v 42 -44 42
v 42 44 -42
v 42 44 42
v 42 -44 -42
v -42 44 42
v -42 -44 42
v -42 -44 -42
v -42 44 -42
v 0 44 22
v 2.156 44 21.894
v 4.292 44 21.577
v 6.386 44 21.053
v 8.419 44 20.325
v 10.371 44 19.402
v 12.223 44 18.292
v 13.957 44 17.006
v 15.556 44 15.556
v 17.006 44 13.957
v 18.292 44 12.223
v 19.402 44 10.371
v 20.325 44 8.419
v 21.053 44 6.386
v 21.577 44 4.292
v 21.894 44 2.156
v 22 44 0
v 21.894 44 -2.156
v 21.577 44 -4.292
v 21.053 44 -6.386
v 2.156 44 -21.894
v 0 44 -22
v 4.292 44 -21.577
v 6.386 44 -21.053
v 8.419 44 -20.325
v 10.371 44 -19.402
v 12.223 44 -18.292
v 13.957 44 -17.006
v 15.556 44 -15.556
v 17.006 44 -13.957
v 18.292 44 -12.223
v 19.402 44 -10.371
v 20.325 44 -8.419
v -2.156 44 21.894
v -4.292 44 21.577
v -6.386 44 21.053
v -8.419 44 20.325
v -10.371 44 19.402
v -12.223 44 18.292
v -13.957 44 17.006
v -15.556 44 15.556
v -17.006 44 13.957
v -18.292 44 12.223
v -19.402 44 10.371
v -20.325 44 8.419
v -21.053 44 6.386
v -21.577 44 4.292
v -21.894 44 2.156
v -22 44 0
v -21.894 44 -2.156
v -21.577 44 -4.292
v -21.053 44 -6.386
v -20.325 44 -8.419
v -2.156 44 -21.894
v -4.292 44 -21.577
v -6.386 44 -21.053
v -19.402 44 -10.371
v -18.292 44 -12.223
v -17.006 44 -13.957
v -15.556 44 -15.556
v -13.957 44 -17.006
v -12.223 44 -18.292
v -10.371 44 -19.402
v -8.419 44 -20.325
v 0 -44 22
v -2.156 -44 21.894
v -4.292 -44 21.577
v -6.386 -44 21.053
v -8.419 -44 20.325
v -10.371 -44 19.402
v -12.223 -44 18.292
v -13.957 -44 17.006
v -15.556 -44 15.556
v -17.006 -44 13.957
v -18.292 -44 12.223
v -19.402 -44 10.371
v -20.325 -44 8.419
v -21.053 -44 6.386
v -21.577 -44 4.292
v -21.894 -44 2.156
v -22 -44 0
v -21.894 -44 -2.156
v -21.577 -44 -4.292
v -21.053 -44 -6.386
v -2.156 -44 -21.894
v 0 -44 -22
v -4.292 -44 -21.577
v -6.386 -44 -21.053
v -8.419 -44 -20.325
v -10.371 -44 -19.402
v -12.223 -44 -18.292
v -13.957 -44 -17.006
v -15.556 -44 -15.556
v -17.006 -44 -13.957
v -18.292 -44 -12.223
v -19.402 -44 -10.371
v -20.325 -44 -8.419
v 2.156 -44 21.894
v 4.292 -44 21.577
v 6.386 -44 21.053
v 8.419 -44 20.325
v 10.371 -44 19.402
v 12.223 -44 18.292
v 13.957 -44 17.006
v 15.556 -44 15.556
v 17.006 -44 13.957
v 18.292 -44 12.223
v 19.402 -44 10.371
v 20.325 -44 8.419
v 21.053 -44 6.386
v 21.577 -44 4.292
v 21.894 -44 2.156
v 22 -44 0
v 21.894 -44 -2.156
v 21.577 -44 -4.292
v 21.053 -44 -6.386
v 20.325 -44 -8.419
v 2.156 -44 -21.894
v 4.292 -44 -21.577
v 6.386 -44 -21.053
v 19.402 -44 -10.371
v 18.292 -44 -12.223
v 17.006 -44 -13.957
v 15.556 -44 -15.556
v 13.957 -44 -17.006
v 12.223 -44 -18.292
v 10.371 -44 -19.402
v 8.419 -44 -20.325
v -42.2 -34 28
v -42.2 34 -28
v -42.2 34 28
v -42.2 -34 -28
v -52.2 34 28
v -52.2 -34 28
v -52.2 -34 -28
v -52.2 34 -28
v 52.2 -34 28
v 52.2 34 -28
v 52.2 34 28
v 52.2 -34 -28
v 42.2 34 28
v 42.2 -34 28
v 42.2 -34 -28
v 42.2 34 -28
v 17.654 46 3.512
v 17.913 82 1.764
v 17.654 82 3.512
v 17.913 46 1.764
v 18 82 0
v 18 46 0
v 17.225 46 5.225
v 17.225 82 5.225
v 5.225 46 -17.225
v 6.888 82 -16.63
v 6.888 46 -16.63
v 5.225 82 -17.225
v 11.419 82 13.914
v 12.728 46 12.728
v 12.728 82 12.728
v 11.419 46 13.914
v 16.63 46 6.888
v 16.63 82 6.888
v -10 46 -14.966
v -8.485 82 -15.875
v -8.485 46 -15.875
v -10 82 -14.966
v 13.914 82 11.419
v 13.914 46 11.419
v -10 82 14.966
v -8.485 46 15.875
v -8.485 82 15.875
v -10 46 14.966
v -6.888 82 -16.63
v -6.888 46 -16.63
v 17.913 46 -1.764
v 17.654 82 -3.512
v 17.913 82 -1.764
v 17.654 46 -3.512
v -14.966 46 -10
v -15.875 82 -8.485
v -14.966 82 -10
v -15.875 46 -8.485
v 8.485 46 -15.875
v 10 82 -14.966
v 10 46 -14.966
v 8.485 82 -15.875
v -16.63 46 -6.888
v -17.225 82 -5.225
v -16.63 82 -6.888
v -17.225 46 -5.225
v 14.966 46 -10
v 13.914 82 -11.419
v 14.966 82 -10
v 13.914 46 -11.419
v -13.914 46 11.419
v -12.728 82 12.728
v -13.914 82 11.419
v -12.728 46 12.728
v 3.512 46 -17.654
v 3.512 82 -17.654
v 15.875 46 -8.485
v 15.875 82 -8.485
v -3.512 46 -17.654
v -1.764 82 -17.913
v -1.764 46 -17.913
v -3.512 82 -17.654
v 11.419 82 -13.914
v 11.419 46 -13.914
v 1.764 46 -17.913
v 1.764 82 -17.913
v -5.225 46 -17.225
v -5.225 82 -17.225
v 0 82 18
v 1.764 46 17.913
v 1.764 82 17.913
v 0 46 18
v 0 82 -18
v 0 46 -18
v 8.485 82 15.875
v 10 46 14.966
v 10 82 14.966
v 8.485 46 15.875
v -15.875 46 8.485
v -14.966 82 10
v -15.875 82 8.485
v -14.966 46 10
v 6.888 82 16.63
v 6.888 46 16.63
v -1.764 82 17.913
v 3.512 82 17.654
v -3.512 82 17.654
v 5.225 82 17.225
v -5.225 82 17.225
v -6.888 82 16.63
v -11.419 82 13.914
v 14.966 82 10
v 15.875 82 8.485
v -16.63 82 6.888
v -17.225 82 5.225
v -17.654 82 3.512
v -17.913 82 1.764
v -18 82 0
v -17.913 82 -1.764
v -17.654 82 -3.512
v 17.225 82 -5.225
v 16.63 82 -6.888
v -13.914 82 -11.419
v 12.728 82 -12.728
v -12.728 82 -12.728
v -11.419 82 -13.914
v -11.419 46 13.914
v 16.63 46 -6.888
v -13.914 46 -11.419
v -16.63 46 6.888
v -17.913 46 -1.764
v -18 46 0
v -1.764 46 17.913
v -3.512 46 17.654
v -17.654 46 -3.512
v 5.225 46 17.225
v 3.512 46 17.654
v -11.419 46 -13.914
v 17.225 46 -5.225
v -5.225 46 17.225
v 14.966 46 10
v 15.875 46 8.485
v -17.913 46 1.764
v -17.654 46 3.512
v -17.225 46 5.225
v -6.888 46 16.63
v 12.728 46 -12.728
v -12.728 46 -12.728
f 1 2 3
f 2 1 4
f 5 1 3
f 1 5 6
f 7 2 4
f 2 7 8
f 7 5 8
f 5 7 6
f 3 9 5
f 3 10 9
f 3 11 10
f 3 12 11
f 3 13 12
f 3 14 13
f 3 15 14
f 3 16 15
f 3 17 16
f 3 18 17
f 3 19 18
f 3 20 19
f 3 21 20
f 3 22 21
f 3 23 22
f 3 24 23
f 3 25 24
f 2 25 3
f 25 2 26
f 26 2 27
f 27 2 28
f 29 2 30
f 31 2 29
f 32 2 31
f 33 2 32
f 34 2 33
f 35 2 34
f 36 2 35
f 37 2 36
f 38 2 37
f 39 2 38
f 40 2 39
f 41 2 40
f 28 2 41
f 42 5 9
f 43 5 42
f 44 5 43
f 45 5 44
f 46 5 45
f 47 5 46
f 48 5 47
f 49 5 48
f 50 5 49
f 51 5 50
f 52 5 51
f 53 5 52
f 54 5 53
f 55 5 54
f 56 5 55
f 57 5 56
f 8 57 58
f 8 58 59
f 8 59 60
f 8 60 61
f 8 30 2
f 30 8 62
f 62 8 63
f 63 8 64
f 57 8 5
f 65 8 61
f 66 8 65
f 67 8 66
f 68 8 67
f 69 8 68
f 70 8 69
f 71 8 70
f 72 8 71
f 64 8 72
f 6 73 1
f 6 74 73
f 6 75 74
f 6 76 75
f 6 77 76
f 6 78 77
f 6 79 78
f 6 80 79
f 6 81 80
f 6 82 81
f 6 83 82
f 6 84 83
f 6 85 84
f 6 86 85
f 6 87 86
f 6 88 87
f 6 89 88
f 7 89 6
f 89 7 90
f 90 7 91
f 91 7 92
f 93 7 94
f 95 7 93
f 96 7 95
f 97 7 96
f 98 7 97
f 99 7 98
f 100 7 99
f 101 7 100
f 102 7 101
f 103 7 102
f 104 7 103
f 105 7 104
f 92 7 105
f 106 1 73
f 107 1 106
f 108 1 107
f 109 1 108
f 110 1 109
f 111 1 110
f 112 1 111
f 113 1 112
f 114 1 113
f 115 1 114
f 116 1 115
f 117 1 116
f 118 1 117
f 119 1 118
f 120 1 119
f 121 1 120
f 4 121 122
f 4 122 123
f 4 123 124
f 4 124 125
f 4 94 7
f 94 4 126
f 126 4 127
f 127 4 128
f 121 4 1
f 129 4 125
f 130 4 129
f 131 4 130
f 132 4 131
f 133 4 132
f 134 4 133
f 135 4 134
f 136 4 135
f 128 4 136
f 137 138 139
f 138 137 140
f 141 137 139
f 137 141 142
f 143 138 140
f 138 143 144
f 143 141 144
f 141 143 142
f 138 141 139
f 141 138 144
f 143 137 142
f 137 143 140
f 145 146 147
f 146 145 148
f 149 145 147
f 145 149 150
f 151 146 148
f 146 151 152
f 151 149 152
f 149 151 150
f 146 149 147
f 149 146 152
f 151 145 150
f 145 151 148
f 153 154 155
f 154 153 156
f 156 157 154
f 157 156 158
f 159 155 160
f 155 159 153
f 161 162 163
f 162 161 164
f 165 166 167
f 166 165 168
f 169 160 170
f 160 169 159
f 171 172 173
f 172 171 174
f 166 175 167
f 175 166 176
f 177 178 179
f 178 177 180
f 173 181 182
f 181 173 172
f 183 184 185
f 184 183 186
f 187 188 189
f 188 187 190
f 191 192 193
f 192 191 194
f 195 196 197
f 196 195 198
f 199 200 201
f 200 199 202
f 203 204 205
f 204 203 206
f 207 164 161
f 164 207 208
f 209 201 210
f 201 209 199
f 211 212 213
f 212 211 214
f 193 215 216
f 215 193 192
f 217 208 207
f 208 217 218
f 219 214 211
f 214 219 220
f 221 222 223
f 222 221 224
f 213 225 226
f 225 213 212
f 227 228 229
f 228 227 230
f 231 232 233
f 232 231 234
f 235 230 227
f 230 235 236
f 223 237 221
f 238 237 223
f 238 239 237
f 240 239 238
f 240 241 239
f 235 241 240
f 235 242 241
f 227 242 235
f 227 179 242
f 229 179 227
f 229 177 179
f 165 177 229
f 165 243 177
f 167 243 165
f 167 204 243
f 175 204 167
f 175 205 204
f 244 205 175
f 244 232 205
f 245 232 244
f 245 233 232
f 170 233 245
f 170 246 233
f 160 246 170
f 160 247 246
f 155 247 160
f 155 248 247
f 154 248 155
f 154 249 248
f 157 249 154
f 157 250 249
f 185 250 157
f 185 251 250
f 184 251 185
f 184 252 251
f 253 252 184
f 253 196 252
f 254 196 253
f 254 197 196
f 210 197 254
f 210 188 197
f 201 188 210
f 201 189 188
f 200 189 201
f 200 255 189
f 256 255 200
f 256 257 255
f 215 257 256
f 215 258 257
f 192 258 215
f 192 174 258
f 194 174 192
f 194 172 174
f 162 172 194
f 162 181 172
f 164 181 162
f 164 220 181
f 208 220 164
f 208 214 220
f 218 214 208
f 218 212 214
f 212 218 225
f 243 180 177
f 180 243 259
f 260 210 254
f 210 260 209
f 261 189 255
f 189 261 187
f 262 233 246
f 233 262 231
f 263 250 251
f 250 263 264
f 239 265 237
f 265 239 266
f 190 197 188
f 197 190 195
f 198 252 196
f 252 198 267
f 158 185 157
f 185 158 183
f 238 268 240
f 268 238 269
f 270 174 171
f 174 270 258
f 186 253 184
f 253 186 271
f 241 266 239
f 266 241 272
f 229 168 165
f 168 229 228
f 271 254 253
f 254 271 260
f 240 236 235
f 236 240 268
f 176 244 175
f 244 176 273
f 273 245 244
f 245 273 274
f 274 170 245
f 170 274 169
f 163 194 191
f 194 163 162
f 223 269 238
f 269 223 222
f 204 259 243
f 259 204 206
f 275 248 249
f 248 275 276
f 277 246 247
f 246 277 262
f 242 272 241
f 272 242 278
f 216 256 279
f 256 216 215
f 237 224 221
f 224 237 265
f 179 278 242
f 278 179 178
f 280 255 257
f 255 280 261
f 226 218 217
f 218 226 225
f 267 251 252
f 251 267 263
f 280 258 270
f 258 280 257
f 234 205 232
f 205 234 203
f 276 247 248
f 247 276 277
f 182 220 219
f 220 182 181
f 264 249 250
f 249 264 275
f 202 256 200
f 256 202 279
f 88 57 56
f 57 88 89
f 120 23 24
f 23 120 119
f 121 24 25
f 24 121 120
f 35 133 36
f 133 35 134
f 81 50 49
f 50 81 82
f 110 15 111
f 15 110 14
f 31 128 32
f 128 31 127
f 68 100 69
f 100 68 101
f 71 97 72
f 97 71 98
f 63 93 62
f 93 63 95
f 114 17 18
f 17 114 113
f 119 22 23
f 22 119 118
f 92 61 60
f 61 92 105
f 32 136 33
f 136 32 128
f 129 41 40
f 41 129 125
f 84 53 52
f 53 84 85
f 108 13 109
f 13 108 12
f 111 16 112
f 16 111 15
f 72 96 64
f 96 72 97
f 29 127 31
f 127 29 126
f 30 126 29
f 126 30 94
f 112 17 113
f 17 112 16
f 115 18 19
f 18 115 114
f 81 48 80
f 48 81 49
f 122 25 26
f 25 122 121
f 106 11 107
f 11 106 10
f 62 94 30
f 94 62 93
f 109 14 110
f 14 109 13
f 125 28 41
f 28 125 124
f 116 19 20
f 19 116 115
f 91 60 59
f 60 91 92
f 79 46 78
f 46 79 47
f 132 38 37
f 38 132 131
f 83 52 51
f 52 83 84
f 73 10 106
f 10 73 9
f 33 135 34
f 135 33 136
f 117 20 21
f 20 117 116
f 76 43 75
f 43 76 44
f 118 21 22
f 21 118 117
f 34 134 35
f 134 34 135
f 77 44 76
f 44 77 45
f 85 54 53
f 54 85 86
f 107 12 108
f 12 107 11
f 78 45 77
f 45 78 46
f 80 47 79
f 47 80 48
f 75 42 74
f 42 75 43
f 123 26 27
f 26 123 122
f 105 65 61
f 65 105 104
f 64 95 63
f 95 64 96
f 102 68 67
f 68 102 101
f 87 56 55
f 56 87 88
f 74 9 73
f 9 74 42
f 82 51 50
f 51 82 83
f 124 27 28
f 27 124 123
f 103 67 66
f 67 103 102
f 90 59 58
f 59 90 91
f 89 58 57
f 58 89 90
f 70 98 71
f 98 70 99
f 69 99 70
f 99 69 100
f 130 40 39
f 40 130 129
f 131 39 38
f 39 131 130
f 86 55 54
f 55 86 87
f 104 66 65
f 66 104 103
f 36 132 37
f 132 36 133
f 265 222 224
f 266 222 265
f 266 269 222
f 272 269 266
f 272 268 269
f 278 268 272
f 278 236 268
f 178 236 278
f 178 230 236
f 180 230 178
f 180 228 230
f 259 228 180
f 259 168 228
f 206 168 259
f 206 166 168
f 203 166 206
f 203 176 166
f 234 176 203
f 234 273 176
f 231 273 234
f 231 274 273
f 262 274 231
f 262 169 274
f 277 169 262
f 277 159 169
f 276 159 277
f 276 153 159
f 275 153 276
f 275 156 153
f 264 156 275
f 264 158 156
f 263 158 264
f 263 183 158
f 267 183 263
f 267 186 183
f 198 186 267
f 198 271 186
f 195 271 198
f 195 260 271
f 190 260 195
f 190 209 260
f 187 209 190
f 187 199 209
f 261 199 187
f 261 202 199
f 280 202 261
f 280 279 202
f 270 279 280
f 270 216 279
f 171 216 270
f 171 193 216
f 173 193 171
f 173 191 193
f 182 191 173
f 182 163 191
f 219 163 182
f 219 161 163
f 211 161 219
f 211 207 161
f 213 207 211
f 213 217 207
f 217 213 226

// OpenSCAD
// ============================================================================
// Atom Lithography Machine — Parametric OpenSCAD Module (S5.5-01)
// ============================================================================
// part_id           : S5.5-01
// parent_bom_id     : S5.5
// subsystem         : S5
// part_name         : 808 nm qCW diyot-lazer bar istifi ve 84x88x84 mm duz-tepe homojenlestirici kafa (Exp130/139)
// material          : Al 6061
// temp_stage        : 300 K (su sogutmali)
// vacuum_grade      : Atmosfer (optik giris)
// tolerance         : ±2% akı duzgunlugu
// computed_mass_kg  : 1.67793
// envelope_mm       : 104.400 x 126.000 x 88.750
// design_maturity   : M0_M1_DETAILED_CAD_DESIGN_ONLY
// no_lab_measurement: true
// iec61508_certified: false
// semi_s2_certified : false
// Units: millimeters (mm)
// ============================================================================

$fn = 64;

// Nominal bounding envelope parameters (mm)
bbox_x = 104.4000;
bbox_y = 126.0000;
bbox_z = 88.7500;

// Part-specific parametric dimensions
core_x = 84.0;
core_y = 88.0;
core_z = 84.0;
wavelength_nm = 808.0;

// Interface / port parameters (mm)
port_homogenized_808nm_out_bore = 44.000;
port_dichroic_diag_top_bore = 28.000;
port_fiber_bundle_in_od = 36.000;
port_fiber_bundle_in_bore = 22.000;

module part_S5_5_01() {
  difference() {
    union() {
      // 84x88x84 mm flat-top 808 nm homogenizer housing
      cube([84.000, 88.000, 84.000], center=true);
      // OFHC Cu micro-channel water cooler (-X)
      translate([-47.200, 0.000, 0.000]) cube([10.000, 68.000, 56.000], center=true);
      // OFHC Cu micro-channel water cooler (+X)
      translate([47.200, 0.000, 0.000]) cube([10.000, 68.000, 56.000], center=true);
      // 808 nm qCW fiber-bundle collimator
      translate([0.000, 63.100, 0.000]) rotate([90.000, 0.000, 0.000]) cylinder(d=36.000, h=37.800, center=true);
    }
    // Dia 44 mm 808 nm optical bore
    rotate([90.000, 0.000, 0.000]) cylinder(d=44.000, h=92.000, center=true);
  }
}

// World assembly mounting transform (global machine frame, mm / deg):
// translate([0.000, 385.000, 500.000]) rotate([0.000, 0.000, 0.000]) part_S5_5_01();

part_S5_5_01();
